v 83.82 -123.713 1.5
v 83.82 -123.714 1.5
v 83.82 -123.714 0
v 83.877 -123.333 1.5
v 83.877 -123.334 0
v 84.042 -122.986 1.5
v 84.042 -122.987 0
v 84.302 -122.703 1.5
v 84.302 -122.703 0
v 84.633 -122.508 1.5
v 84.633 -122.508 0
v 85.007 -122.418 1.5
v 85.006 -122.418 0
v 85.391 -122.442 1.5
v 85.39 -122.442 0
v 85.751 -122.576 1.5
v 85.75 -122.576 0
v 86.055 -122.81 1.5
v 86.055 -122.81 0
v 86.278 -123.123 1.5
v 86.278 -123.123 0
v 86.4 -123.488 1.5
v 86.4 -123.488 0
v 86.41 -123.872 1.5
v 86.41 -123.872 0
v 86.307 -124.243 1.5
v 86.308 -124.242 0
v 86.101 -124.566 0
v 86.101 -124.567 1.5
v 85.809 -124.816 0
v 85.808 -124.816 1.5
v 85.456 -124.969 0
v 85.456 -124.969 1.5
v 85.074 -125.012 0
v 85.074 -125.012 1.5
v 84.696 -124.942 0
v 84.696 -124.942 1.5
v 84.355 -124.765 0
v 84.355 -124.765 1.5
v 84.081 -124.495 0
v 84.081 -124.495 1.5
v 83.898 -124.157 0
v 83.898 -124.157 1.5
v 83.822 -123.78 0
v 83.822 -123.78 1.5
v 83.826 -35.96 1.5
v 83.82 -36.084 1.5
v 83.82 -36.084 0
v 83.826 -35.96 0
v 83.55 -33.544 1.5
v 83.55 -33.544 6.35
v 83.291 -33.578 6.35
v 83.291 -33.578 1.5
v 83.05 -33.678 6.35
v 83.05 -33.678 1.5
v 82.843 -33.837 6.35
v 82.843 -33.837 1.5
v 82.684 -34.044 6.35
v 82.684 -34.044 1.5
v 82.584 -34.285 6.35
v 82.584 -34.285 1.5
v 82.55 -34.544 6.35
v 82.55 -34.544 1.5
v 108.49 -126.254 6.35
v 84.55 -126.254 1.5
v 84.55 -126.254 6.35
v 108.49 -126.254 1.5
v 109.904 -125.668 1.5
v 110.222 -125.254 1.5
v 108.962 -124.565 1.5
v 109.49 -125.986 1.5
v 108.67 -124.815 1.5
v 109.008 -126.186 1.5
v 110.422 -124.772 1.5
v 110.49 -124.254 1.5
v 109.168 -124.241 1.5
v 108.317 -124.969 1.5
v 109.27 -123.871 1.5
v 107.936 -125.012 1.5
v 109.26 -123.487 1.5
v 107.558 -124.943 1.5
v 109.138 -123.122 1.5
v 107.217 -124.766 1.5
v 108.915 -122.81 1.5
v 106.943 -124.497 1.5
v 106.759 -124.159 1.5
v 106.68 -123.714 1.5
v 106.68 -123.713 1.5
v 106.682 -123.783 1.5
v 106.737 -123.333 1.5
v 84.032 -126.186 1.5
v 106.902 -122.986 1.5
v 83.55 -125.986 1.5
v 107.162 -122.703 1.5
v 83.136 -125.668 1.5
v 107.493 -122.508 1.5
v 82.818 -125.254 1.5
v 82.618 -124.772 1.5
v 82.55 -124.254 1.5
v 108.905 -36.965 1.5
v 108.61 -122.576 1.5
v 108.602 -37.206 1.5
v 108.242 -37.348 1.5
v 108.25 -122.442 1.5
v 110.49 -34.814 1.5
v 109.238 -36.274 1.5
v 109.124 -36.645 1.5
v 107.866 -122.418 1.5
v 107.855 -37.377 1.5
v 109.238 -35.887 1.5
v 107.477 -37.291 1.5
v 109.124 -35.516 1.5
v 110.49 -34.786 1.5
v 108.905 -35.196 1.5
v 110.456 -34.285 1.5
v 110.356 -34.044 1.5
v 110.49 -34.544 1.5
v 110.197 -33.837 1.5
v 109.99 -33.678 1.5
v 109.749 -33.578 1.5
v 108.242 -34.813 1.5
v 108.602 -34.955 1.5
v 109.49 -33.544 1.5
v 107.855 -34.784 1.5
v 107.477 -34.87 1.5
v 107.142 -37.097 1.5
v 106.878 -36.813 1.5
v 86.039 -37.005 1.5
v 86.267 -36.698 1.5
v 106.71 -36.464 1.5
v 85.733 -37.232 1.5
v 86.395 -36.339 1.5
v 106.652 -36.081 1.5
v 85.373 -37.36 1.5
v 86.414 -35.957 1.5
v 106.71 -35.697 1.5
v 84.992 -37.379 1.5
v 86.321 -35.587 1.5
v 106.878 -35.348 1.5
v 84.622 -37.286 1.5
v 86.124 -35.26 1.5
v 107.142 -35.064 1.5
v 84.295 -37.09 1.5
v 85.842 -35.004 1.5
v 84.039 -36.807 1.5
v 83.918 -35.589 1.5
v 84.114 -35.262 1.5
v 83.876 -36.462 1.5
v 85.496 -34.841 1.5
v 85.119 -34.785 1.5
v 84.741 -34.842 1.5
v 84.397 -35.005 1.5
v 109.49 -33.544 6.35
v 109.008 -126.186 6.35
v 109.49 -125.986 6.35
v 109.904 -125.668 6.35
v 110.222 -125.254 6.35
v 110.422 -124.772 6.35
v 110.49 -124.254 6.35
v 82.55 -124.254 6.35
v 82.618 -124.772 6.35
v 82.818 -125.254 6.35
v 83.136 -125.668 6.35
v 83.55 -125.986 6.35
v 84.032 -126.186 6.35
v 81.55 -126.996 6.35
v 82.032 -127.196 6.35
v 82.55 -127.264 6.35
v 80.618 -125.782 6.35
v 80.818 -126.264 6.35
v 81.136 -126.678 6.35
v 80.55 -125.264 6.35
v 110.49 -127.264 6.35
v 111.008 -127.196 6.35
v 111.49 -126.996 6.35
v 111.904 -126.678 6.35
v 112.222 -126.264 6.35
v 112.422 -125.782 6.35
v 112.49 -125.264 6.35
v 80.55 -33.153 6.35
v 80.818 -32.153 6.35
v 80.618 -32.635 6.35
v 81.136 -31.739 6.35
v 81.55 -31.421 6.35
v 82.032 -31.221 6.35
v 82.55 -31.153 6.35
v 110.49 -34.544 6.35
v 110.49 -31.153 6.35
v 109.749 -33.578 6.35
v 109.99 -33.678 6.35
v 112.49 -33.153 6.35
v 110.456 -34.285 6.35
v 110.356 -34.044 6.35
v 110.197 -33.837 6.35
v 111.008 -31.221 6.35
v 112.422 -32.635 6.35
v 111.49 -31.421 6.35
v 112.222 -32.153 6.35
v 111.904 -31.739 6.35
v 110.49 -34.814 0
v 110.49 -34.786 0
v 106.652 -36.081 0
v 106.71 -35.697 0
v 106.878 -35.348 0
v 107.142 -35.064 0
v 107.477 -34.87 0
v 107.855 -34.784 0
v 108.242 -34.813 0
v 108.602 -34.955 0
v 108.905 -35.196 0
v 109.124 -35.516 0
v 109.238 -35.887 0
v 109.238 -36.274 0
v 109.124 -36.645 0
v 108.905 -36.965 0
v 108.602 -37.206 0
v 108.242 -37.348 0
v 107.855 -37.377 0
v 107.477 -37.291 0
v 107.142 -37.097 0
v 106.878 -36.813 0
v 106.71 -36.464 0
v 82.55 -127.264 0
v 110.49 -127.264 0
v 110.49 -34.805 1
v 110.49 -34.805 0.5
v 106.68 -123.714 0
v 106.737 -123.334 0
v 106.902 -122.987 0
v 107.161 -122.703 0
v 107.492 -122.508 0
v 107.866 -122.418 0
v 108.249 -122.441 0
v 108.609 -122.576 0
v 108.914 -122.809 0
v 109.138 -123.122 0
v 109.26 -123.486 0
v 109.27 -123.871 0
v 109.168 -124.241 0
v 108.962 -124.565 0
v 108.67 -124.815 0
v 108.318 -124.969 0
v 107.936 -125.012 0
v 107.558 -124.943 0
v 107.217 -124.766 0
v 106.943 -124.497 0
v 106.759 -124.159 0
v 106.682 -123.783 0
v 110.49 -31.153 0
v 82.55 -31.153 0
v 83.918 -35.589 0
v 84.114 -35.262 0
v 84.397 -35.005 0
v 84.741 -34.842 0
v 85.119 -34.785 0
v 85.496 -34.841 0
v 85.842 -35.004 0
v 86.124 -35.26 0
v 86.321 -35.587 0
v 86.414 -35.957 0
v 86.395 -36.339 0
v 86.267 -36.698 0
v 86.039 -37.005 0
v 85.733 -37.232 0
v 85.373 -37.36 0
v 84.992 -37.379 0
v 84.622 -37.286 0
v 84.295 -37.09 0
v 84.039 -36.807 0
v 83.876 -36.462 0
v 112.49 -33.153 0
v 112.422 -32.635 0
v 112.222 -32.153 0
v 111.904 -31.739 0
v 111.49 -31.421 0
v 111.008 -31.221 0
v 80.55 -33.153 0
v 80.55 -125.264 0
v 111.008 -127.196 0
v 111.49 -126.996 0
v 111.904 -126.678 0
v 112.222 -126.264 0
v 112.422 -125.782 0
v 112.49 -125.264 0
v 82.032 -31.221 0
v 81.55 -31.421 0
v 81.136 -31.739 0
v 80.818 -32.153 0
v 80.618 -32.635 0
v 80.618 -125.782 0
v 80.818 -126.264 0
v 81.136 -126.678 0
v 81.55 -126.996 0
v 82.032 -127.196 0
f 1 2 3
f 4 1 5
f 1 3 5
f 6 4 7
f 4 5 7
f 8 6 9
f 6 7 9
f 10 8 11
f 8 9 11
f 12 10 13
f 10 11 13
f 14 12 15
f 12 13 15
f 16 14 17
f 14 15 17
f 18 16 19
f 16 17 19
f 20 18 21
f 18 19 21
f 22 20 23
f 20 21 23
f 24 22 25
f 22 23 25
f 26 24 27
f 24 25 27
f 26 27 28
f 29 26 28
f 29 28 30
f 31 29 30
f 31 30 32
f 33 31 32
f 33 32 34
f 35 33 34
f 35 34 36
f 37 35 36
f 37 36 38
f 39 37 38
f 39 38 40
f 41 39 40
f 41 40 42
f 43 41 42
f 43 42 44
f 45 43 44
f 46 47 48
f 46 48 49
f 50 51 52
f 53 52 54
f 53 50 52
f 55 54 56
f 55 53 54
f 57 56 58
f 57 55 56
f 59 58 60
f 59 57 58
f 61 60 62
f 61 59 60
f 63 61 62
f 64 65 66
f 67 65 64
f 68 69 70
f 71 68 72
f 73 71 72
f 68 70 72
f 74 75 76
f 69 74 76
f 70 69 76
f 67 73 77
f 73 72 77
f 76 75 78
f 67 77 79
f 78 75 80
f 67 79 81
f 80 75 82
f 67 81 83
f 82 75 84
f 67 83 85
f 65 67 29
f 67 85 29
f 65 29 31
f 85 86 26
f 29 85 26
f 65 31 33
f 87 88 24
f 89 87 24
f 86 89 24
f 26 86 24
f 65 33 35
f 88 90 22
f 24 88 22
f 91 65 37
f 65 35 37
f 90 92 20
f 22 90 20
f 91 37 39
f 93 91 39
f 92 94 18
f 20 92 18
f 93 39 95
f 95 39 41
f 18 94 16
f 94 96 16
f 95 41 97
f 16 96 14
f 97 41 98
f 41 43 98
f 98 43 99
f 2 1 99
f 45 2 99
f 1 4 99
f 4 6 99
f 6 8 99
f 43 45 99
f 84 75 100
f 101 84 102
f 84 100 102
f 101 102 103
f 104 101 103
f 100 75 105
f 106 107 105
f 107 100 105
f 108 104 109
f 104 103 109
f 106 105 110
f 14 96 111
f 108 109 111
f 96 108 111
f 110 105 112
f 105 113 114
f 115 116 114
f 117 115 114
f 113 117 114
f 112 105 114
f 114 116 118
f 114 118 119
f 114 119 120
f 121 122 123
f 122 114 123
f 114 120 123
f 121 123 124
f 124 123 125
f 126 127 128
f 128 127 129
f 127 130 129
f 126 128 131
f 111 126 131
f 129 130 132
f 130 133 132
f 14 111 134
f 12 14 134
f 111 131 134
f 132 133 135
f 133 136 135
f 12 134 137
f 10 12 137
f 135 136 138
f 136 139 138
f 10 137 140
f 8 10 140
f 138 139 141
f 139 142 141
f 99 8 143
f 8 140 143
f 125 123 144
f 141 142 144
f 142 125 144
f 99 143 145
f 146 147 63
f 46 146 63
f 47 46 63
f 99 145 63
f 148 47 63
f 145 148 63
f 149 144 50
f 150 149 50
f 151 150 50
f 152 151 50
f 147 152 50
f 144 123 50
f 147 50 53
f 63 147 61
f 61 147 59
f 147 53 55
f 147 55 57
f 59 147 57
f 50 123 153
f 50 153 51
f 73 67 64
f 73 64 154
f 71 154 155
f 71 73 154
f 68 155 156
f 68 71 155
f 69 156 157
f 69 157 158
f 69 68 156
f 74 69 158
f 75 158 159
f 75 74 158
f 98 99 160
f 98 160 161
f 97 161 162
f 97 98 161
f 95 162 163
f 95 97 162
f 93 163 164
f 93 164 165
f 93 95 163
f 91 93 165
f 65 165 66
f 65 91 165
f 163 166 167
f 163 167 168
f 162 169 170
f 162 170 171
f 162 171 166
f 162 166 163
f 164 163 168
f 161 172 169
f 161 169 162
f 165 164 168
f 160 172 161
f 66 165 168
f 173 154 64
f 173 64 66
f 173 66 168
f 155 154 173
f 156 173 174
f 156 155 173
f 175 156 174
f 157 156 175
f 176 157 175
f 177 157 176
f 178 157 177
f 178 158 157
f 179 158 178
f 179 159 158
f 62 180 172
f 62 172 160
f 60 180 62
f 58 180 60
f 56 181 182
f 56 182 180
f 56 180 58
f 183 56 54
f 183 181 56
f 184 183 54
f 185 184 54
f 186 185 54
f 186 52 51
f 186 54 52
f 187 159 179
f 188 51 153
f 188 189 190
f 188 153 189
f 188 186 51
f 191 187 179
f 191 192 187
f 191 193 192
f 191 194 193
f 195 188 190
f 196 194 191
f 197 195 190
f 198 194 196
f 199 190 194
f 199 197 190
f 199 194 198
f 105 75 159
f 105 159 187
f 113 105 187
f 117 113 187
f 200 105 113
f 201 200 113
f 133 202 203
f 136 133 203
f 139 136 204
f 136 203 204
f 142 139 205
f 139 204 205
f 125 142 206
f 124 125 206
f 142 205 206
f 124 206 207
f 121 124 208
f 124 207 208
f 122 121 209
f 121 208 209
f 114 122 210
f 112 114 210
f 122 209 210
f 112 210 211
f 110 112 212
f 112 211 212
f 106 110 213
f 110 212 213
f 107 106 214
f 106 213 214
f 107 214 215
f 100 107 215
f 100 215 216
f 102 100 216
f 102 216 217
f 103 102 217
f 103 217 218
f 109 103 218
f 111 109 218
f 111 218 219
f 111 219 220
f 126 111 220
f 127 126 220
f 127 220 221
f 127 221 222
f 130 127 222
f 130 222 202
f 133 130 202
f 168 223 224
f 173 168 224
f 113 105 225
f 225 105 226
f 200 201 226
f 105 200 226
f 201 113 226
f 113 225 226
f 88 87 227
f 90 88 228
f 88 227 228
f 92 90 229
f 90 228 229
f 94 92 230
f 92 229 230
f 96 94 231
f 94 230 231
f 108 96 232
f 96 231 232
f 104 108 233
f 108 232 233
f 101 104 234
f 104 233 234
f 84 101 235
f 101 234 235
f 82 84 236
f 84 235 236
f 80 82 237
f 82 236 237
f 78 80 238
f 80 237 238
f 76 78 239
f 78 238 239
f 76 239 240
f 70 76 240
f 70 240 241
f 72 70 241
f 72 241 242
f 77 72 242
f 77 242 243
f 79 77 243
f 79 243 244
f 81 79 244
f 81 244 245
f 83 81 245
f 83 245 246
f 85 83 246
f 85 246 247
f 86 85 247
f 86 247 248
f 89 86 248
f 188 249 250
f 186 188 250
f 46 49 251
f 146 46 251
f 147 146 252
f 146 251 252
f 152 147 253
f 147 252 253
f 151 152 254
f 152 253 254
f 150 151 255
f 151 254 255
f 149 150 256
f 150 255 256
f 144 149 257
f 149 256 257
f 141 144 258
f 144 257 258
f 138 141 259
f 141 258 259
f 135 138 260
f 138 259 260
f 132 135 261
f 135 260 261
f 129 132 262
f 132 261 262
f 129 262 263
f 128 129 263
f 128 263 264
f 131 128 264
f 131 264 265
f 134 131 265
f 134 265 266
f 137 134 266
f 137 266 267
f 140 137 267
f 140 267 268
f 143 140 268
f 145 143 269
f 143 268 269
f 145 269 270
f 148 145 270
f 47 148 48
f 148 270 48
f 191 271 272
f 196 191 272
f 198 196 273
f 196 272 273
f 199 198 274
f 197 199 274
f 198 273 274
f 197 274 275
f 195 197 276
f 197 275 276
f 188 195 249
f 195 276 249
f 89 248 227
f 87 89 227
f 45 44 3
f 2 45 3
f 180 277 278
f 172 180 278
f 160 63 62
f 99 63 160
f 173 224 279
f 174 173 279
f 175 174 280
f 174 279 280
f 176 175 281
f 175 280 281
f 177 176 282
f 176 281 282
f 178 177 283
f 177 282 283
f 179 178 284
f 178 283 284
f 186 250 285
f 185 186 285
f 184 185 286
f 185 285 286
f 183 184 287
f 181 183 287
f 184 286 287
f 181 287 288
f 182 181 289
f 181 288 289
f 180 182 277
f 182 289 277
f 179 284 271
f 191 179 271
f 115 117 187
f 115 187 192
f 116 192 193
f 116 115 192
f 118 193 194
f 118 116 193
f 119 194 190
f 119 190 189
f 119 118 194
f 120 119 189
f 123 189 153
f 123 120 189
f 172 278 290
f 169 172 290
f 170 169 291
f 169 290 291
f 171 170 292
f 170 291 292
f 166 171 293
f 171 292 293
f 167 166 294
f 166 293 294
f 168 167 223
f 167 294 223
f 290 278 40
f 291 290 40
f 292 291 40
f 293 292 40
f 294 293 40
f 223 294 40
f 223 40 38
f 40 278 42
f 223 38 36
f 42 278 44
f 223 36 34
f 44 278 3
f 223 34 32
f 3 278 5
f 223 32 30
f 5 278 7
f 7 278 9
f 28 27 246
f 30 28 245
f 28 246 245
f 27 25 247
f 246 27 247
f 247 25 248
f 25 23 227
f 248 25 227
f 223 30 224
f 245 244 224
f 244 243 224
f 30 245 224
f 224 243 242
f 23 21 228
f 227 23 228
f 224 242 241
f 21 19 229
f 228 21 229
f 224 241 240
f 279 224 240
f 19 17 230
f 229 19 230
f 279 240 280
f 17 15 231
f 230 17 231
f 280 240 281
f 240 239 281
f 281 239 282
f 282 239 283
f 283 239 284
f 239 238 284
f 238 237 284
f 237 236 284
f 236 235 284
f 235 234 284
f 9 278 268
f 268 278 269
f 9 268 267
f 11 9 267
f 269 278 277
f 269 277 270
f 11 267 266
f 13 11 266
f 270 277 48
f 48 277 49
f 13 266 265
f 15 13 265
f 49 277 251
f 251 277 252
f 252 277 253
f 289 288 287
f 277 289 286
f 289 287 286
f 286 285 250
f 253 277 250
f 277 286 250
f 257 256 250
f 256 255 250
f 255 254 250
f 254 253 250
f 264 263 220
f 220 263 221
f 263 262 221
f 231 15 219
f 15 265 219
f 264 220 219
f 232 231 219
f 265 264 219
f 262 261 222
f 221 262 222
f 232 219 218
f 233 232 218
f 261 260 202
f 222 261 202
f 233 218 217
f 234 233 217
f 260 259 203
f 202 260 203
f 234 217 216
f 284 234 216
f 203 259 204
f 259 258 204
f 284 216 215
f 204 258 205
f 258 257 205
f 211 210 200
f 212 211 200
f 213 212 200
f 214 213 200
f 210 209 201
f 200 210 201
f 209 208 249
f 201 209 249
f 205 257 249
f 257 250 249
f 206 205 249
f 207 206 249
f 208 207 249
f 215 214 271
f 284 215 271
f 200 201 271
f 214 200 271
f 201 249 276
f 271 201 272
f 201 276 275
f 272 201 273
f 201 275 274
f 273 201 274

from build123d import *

# Parameters (mm, degrees)
BOSS_EXTRU_1_DEPTH      = 1.5
BOSS_EXTRU_2_DEPTH      = 6.35
ESQUISSE2_W             = 2.048679464
ESQUISSE2_H             = 2.722217918
ESQUISSE2_W_2           = 2.383965353
ESQUISSE2_H_2           = 1.994278708
BOSS_EXTRU_3_DEPTH      = 1.5
ESQUISSE3_R             = 1.3
ENL_V_MAT_EXTRU_1_DEPTH = 170.97185291


with BuildPart() as part:
    # Model → Boss.-Extru.1 (new body)
    with BuildSketch(Plane.XY):
        with BuildLine():
            Line((110.49, -34.813931), (110.49, -38.623931))
            Line((110.49, -38.623931), (110.49, -39.893931))
            Line((110.49, -39.893931), (110.49, -123.713931))
            add(Edge.make_bspline(
                [(109.746051, -125.509982), (110.222394, -125.03364), (110.49, -124.387581), (110.49, -123.713931)],
                knots=[0, 0, 0, 0, 1, 1, 1, 1], degree=3))
            add(Edge.make_bspline(
                [(107.95, -126.253931), (108.62365, -126.253931), (109.269709, -125.986325), (109.746051, -125.509982)],
                knots=[0, 0, 0, 0, 1, 1, 1, 1], degree=3))
            Line((107.95, -126.253931), (85.09, -126.253931))
            add(Edge.make_bspline(
                [(83.293949, -125.509982), (83.770291, -125.986325), (84.41635, -126.253931), (85.09, -126.253931)],
                knots=[0, 0, 0, 0, 1, 1, 1, 1], degree=3))
            add(Edge.make_bspline(
                [(82.55, -123.713931), (82.55, -124.387581), (82.817606, -125.03364), (83.293949, -125.509982)],
                knots=[0, 0, 0, 0, 1, 1, 1, 1], degree=3))
            Line((82.55, -123.713931), (82.55, -39.893931))
            Line((82.55, -39.893931), (82.55, -38.623931))
            Line((82.55, -38.623931), (82.55, -34.813931))
            add(Edge.make_bspline(
                [(82.921974, -33.915905), (82.683803, -34.154076), (82.55, -34.477106), (82.55, -34.813931)],
                knots=[0, 0, 0, 0, 1, 1, 1, 1], degree=3))
            add(Edge.make_bspline(
                [(83.82, -33.543931), (83.483175, -33.543931), (83.160146, -33.677734), (82.921974, -33.915905)],
                knots=[0, 0, 0, 0, 1, 1, 1, 1], degree=3))
            Line((83.82, -33.543931), (109.22, -33.543931))
            add(Edge.make_bspline(
                [(110.118026, -33.915905), (109.879854, -33.677734), (109.556825, -33.543931), (109.22, -33.543931)],
                knots=[0, 0, 0, 0, 1, 1, 1, 1], degree=3))
            add(Edge.make_bspline(
                [(110.49, -34.813931), (110.49, -34.477106), (110.356197, -34.154076), (110.118026, -33.915905)],
                knots=[0, 0, 0, 0, 1, 1, 1, 1], degree=3))
        make_face()
        with BuildLine():
            add(Edge.make_bspline(
                [(109.22, -36.083931), (109.22, -36.537658), (108.977939, -36.956919), (108.585, -37.183783)],
                knots=[0, 0, 0, 0, 1, 1, 1, 1], degree=3))
            add(Edge.make_bspline(
                [(108.585, -37.183783), (108.192061, -37.410647), (107.707939, -37.410647), (107.315, -37.183783)],
                knots=[0, 0, 0, 0, 1, 1, 1, 1], degree=3))
            add(Edge.make_bspline(
                [(107.315, -37.183783), (106.922061, -36.956919), (106.68, -36.537658), (106.68, -36.083931)],
                knots=[0, 0, 0, 0, 1, 1, 1, 1], degree=3))
            add(Edge.make_bspline(
                [(106.68, -36.083931), (106.68, -35.630204), (106.922061, -35.210942), (107.315, -34.984079)],
                knots=[0, 0, 0, 0, 1, 1, 1, 1], degree=3))
            add(Edge.make_bspline(
                [(107.315, -34.984079), (107.707939, -34.757215), (108.192061, -34.757215), (108.585, -34.984079)],
                knots=[0, 0, 0, 0, 1, 1, 1, 1], degree=3))
            add(Edge.make_bspline(
                [(108.585, -34.984079), (108.977939, -35.210942), (109.22, -35.630204), (109.22, -36.083931)],
                knots=[0, 0, 0, 0, 1, 1, 1, 1], degree=3))
        make_face(mode=Mode.SUBTRACT)
        with BuildLine():
            add(Edge.make_bspline(
                [(86.36, -36.083931), (86.36, -36.537658), (86.117939, -36.956919), (85.725, -37.183783)],
                knots=[0, 0, 0, 0, 1, 1, 1, 1], degree=3))
            add(Edge.make_bspline(
                [(85.725, -37.183783), (85.332061, -37.410647), (84.847939, -37.410647), (84.455, -37.183783)],
                knots=[0, 0, 0, 0, 1, 1, 1, 1], degree=3))
            add(Edge.make_bspline(
                [(84.455, -37.183783), (84.062061, -36.956919), (83.82, -36.537658), (83.82, -36.083931)],
                knots=[0, 0, 0, 0, 1, 1, 1, 1], degree=3))
            add(Edge.make_bspline(
                [(83.82, -36.083931), (83.82, -35.630204), (84.062061, -35.210942), (84.455, -34.984079)],
                knots=[0, 0, 0, 0, 1, 1, 1, 1], degree=3))
            add(Edge.make_bspline(
                [(84.455, -34.984079), (84.847939, -34.757215), (85.332061, -34.757215), (85.725, -34.984079)],
                knots=[0, 0, 0, 0, 1, 1, 1, 1], degree=3))
            add(Edge.make_bspline(
                [(85.725, -34.984079), (86.117939, -35.210942), (86.36, -35.630204), (86.36, -36.083931)],
                knots=[0, 0, 0, 0, 1, 1, 1, 1], degree=3))
        make_face(mode=Mode.SUBTRACT)
        with BuildLine():
            add(Edge.make_bspline(
                [(86.36, -123.713931), (86.36, -124.167658), (86.117939, -124.586919), (85.725, -124.813783)],
                knots=[0, 0, 0, 0, 1, 1, 1, 1], degree=3))
            add(Edge.make_bspline(
                [(85.725, -124.813783), (85.332061, -125.040647), (84.847939, -125.040647), (84.455, -124.813783)],
                knots=[0, 0, 0, 0, 1, 1, 1, 1], degree=3))
            add(Edge.make_bspline(
                [(84.455, -124.813783), (84.062061, -124.586919), (83.82, -124.167658), (83.82, -123.713931)],
                knots=[0, 0, 0, 0, 1, 1, 1, 1], degree=3))
            add(Edge.make_bspline(
                [(83.82, -123.713931), (83.82, -123.260204), (84.062061, -122.840942), (84.455, -122.614079)],
                knots=[0, 0, 0, 0, 1, 1, 1, 1], degree=3))
            add(Edge.make_bspline(
                [(84.455, -122.614079), (84.847939, -122.387215), (85.332061, -122.387215), (85.725, -122.614079)],
                knots=[0, 0, 0, 0, 1, 1, 1, 1], degree=3))
            add(Edge.make_bspline(
                [(85.725, -122.614079), (86.117939, -122.840942), (86.36, -123.260204), (86.36, -123.713931)],
                knots=[0, 0, 0, 0, 1, 1, 1, 1], degree=3))
        make_face(mode=Mode.SUBTRACT)
        with BuildLine():
            add(Edge.make_bspline(
                [(109.22, -123.713931), (109.22, -124.167658), (108.977939, -124.586919), (108.585, -124.813783)],
                knots=[0, 0, 0, 0, 1, 1, 1, 1], degree=3))
            add(Edge.make_bspline(
                [(108.585, -124.813783), (108.192061, -125.040647), (107.707939, -125.040647), (107.315, -124.813783)],
                knots=[0, 0, 0, 0, 1, 1, 1, 1], degree=3))
            add(Edge.make_bspline(
                [(107.315, -124.813783), (106.922061, -124.586919), (106.68, -124.167658), (106.68, -123.713931)],
                knots=[0, 0, 0, 0, 1, 1, 1, 1], degree=3))
            add(Edge.make_bspline(
                [(106.68, -123.713931), (106.68, -123.260204), (106.922061, -122.840942), (107.315, -122.614079)],
                knots=[0, 0, 0, 0, 1, 1, 1, 1], degree=3))
            add(Edge.make_bspline(
                [(107.315, -122.614079), (107.707939, -122.387215), (108.192061, -122.387215), (108.585, -122.614079)],
                knots=[0, 0, 0, 0, 1, 1, 1, 1], degree=3))
            add(Edge.make_bspline(
                [(108.585, -122.614079), (108.977939, -122.840942), (109.22, -123.260204), (109.22, -123.713931)],
                knots=[0, 0, 0, 0, 1, 1, 1, 1], degree=3))
        make_face(mode=Mode.SUBTRACT)
    extrude(amount=BOSS_EXTRU_1_DEPTH)

    # Esquisse1 → Boss.-Extru.2 (add)
    with BuildSketch(Plane(origin=(0, 0, 0), x_dir=(-1, 0, 0), z_dir=(0, 0, -1))):
        with BuildLine():
            Line((-110.49, -31.152890146), (-82.55, -31.152890146))
            ThreePointArc((-82.55, -31.152890146), (-81.135786438, -31.738676584), (-80.55, -33.152890146))
            Line((-80.55, -33.152890146), (-80.55, -125.263931))
            ThreePointArc((-80.55, -125.263931), (-81.135786438, -126.678144562), (-82.55, -127.263931))
            Line((-82.55, -127.263931), (-110.49, -127.263931))
            ThreePointArc((-110.49, -127.263931), (-111.904213562, -126.678144562), (-112.49, -125.263931))
            Line((-112.49, -125.263931), (-112.49, -33.152890146))
            ThreePointArc((-112.49, -33.152890146), (-111.904213562, -31.738676584), (-110.49, -31.152890146))
        make_face()
        with BuildLine():
            Line((-109.49, -33.543931), (-83.55, -33.543931))
            ThreePointArc((-83.55, -33.543931), (-82.842893219, -33.836824219), (-82.55, -34.543931))
            Line((-82.55, -34.543931), (-82.55, -124.253931))
            ThreePointArc((-82.55, -124.253931), (-83.135786438, -125.668144562), (-84.55, -126.253931))
            Line((-84.55, -126.253931), (-108.49, -126.253931))
            ThreePointArc((-108.49, -126.253931), (-109.904213562, -125.668144562), (-110.49, -124.253931))
            Line((-110.49, -124.253931), (-110.49, -34.543931))
            ThreePointArc((-110.49, -34.543931), (-110.197106781, -33.836824219), (-109.49, -33.543931))
        make_face(mode=Mode.SUBTRACT)
    extrude(amount=-BOSS_EXTRU_2_DEPTH)

    # Esquisse2 → Boss.-Extru.3 (add)
    with BuildSketch(Plane.XY.offset(1.5)):
        Polygon((82.862908546, -122.803540967), (81.718920114, -124.049976123), (82.862908546, -126.448936938), (85.492374492, -126.781888794), (85.441151129, -125.817182132), (83.793466299, -125.023220012), (83.059264769, -123.828008219), align=None)
        with Locations((82.84166356, -34.077464167)):
            Rectangle(ESQUISSE2_W, ESQUISSE2_H)
        with Locations((109.83167143, -33.789106507)):
            Rectangle(ESQUISSE2_W_2, ESQUISSE2_H_2)
        Polygon((111.079756548, -122.69864172), (110.01722417, -123.503842038), (109.201933768, -125.195788786), (107.319834078, -125.55652456), (107.178740755, -126.670800036), (110.27455623, -126.615412866), (111.506281277, -125.468783374), align=None)
    extrude(amount=-BOSS_EXTRU_3_DEPTH)

    # Esquisse3 → Enlèv. mat.-Extru.1 (cut, through all)
    with BuildSketch(Plane(origin=(0, 0, 0), x_dir=(-1, 0, 0), z_dir=(0, 0, -1))):
        with Locations((-107.952359108, -36.080520753)):
            Circle(ESQUISSE3_R)
        with Locations((-85.119999339, -36.08524195)):
            Circle(ESQUISSE3_R)
        with Locations((-107.979999813, -123.71323395)):
            Circle(ESQUISSE3_R)
        with Locations((-85.119999826, -123.713259066)):
            Circle(ESQUISSE3_R)
    extrude(amount=-ENL_V_MAT_EXTRU_1_DEPTH, mode=Mode.SUBTRACT)


solid = part.part
